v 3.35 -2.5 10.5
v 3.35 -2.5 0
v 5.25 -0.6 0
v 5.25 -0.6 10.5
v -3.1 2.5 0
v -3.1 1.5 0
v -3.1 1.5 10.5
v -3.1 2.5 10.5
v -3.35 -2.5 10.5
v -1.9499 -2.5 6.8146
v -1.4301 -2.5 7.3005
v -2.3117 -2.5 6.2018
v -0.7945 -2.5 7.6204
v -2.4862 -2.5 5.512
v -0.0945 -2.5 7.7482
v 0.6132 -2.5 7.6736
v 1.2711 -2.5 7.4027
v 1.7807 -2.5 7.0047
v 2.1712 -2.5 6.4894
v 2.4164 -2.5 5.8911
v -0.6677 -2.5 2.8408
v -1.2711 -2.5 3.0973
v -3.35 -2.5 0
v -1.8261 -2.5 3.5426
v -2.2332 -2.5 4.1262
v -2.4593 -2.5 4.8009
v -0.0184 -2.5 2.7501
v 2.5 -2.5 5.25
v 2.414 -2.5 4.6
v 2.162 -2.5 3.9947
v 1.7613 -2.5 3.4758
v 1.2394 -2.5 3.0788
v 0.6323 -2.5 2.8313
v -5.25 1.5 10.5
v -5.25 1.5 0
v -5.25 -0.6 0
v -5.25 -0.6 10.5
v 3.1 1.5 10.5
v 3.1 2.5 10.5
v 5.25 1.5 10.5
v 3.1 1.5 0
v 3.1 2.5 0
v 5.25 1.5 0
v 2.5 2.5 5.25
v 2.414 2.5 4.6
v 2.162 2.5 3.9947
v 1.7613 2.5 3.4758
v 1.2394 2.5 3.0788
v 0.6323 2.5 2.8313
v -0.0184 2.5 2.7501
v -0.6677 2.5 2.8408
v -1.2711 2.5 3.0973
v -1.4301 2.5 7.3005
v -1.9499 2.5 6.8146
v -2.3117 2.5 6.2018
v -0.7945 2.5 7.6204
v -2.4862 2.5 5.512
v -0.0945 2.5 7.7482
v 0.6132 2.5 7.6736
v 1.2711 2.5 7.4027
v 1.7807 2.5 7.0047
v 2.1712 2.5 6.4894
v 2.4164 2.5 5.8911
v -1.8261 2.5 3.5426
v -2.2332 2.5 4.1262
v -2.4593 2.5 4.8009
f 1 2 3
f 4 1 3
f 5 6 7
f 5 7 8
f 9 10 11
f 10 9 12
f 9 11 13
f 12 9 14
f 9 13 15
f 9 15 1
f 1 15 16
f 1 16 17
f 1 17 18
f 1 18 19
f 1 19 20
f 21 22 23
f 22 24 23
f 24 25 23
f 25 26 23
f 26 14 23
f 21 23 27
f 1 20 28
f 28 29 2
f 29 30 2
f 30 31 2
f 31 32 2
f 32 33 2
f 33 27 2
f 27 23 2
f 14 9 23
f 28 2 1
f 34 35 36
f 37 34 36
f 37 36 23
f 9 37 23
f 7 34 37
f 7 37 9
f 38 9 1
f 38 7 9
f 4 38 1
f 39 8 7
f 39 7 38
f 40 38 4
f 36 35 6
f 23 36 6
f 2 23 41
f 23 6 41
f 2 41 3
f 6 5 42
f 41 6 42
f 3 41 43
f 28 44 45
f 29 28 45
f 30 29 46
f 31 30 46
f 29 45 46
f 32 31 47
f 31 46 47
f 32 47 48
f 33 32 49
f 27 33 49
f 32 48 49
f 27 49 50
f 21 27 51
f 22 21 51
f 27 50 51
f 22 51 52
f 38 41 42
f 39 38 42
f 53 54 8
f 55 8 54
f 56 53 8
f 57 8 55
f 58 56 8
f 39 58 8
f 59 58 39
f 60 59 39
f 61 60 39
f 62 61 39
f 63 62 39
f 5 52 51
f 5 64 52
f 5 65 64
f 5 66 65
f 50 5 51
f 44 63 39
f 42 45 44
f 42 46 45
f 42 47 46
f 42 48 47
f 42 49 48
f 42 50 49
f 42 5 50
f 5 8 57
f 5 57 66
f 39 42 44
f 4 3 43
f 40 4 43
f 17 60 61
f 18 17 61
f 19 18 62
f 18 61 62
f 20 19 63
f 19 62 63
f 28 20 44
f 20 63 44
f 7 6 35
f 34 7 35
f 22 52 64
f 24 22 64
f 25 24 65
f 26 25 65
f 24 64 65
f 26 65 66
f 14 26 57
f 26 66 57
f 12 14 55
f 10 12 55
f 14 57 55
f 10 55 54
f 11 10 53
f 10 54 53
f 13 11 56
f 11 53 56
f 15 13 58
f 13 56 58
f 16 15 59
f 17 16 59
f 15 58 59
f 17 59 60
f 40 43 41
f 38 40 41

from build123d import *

# Parameters (mm, degrees)
SKETCH2_W           = 6.2
SKETCH2_H           = 1
BOSS_EXTRUDE1_DEPTH = 10.5
CUT_EXTRUDE1_DEPTH  = 13.759800155


with BuildPart() as part:
    # Sketch2 → Boss-Extrude1 (new body)
    with BuildSketch(Plane.XY):
        Polygon((-3.1, 1.5), (-5.25, 1.5), (-5.25, -0.6), (-3.35, -2.5), (3.35, -2.5), (5.25, -0.6), (5.25, 1.5), (3.1, 1.5), align=None)
        with Locations((0, 2)):
            Rectangle(SKETCH2_W, SKETCH2_H)
    extrude(amount=BOSS_EXTRUDE1_DEPTH)

    # Sketch3 → Cut-Extrude1 (cut, through all)
    with BuildSketch(Plane(origin=(0, 2.5, 0), x_dir=(1, 0, 0), z_dir=(0, 1, 0))):
        with BuildLine():
            ThreePointArc((2.5, -5.25), (1.239388718, -3.078844638), (-1.271132484, -3.097275631))
            Line((-1.271132484, -3.097275631), (1.271132484, -7.402724369))
            ThreePointArc((1.271132484, -7.402724369), (2.171155362, -6.489388718), (2.5, -5.25))
        make_face()
        with BuildLine():
            Line((1.271132484, -7.402724369), (-1.271132484, -3.097275631))
            ThreePointArc((-1.271132484, -3.097275631), (-2.152724369, -6.521132484), (1.271132484, -7.402724369))
        make_face()
    extrude(amount=-CUT_EXTRUDE1_DEPTH, mode=Mode.SUBTRACT)


solid = part.part
